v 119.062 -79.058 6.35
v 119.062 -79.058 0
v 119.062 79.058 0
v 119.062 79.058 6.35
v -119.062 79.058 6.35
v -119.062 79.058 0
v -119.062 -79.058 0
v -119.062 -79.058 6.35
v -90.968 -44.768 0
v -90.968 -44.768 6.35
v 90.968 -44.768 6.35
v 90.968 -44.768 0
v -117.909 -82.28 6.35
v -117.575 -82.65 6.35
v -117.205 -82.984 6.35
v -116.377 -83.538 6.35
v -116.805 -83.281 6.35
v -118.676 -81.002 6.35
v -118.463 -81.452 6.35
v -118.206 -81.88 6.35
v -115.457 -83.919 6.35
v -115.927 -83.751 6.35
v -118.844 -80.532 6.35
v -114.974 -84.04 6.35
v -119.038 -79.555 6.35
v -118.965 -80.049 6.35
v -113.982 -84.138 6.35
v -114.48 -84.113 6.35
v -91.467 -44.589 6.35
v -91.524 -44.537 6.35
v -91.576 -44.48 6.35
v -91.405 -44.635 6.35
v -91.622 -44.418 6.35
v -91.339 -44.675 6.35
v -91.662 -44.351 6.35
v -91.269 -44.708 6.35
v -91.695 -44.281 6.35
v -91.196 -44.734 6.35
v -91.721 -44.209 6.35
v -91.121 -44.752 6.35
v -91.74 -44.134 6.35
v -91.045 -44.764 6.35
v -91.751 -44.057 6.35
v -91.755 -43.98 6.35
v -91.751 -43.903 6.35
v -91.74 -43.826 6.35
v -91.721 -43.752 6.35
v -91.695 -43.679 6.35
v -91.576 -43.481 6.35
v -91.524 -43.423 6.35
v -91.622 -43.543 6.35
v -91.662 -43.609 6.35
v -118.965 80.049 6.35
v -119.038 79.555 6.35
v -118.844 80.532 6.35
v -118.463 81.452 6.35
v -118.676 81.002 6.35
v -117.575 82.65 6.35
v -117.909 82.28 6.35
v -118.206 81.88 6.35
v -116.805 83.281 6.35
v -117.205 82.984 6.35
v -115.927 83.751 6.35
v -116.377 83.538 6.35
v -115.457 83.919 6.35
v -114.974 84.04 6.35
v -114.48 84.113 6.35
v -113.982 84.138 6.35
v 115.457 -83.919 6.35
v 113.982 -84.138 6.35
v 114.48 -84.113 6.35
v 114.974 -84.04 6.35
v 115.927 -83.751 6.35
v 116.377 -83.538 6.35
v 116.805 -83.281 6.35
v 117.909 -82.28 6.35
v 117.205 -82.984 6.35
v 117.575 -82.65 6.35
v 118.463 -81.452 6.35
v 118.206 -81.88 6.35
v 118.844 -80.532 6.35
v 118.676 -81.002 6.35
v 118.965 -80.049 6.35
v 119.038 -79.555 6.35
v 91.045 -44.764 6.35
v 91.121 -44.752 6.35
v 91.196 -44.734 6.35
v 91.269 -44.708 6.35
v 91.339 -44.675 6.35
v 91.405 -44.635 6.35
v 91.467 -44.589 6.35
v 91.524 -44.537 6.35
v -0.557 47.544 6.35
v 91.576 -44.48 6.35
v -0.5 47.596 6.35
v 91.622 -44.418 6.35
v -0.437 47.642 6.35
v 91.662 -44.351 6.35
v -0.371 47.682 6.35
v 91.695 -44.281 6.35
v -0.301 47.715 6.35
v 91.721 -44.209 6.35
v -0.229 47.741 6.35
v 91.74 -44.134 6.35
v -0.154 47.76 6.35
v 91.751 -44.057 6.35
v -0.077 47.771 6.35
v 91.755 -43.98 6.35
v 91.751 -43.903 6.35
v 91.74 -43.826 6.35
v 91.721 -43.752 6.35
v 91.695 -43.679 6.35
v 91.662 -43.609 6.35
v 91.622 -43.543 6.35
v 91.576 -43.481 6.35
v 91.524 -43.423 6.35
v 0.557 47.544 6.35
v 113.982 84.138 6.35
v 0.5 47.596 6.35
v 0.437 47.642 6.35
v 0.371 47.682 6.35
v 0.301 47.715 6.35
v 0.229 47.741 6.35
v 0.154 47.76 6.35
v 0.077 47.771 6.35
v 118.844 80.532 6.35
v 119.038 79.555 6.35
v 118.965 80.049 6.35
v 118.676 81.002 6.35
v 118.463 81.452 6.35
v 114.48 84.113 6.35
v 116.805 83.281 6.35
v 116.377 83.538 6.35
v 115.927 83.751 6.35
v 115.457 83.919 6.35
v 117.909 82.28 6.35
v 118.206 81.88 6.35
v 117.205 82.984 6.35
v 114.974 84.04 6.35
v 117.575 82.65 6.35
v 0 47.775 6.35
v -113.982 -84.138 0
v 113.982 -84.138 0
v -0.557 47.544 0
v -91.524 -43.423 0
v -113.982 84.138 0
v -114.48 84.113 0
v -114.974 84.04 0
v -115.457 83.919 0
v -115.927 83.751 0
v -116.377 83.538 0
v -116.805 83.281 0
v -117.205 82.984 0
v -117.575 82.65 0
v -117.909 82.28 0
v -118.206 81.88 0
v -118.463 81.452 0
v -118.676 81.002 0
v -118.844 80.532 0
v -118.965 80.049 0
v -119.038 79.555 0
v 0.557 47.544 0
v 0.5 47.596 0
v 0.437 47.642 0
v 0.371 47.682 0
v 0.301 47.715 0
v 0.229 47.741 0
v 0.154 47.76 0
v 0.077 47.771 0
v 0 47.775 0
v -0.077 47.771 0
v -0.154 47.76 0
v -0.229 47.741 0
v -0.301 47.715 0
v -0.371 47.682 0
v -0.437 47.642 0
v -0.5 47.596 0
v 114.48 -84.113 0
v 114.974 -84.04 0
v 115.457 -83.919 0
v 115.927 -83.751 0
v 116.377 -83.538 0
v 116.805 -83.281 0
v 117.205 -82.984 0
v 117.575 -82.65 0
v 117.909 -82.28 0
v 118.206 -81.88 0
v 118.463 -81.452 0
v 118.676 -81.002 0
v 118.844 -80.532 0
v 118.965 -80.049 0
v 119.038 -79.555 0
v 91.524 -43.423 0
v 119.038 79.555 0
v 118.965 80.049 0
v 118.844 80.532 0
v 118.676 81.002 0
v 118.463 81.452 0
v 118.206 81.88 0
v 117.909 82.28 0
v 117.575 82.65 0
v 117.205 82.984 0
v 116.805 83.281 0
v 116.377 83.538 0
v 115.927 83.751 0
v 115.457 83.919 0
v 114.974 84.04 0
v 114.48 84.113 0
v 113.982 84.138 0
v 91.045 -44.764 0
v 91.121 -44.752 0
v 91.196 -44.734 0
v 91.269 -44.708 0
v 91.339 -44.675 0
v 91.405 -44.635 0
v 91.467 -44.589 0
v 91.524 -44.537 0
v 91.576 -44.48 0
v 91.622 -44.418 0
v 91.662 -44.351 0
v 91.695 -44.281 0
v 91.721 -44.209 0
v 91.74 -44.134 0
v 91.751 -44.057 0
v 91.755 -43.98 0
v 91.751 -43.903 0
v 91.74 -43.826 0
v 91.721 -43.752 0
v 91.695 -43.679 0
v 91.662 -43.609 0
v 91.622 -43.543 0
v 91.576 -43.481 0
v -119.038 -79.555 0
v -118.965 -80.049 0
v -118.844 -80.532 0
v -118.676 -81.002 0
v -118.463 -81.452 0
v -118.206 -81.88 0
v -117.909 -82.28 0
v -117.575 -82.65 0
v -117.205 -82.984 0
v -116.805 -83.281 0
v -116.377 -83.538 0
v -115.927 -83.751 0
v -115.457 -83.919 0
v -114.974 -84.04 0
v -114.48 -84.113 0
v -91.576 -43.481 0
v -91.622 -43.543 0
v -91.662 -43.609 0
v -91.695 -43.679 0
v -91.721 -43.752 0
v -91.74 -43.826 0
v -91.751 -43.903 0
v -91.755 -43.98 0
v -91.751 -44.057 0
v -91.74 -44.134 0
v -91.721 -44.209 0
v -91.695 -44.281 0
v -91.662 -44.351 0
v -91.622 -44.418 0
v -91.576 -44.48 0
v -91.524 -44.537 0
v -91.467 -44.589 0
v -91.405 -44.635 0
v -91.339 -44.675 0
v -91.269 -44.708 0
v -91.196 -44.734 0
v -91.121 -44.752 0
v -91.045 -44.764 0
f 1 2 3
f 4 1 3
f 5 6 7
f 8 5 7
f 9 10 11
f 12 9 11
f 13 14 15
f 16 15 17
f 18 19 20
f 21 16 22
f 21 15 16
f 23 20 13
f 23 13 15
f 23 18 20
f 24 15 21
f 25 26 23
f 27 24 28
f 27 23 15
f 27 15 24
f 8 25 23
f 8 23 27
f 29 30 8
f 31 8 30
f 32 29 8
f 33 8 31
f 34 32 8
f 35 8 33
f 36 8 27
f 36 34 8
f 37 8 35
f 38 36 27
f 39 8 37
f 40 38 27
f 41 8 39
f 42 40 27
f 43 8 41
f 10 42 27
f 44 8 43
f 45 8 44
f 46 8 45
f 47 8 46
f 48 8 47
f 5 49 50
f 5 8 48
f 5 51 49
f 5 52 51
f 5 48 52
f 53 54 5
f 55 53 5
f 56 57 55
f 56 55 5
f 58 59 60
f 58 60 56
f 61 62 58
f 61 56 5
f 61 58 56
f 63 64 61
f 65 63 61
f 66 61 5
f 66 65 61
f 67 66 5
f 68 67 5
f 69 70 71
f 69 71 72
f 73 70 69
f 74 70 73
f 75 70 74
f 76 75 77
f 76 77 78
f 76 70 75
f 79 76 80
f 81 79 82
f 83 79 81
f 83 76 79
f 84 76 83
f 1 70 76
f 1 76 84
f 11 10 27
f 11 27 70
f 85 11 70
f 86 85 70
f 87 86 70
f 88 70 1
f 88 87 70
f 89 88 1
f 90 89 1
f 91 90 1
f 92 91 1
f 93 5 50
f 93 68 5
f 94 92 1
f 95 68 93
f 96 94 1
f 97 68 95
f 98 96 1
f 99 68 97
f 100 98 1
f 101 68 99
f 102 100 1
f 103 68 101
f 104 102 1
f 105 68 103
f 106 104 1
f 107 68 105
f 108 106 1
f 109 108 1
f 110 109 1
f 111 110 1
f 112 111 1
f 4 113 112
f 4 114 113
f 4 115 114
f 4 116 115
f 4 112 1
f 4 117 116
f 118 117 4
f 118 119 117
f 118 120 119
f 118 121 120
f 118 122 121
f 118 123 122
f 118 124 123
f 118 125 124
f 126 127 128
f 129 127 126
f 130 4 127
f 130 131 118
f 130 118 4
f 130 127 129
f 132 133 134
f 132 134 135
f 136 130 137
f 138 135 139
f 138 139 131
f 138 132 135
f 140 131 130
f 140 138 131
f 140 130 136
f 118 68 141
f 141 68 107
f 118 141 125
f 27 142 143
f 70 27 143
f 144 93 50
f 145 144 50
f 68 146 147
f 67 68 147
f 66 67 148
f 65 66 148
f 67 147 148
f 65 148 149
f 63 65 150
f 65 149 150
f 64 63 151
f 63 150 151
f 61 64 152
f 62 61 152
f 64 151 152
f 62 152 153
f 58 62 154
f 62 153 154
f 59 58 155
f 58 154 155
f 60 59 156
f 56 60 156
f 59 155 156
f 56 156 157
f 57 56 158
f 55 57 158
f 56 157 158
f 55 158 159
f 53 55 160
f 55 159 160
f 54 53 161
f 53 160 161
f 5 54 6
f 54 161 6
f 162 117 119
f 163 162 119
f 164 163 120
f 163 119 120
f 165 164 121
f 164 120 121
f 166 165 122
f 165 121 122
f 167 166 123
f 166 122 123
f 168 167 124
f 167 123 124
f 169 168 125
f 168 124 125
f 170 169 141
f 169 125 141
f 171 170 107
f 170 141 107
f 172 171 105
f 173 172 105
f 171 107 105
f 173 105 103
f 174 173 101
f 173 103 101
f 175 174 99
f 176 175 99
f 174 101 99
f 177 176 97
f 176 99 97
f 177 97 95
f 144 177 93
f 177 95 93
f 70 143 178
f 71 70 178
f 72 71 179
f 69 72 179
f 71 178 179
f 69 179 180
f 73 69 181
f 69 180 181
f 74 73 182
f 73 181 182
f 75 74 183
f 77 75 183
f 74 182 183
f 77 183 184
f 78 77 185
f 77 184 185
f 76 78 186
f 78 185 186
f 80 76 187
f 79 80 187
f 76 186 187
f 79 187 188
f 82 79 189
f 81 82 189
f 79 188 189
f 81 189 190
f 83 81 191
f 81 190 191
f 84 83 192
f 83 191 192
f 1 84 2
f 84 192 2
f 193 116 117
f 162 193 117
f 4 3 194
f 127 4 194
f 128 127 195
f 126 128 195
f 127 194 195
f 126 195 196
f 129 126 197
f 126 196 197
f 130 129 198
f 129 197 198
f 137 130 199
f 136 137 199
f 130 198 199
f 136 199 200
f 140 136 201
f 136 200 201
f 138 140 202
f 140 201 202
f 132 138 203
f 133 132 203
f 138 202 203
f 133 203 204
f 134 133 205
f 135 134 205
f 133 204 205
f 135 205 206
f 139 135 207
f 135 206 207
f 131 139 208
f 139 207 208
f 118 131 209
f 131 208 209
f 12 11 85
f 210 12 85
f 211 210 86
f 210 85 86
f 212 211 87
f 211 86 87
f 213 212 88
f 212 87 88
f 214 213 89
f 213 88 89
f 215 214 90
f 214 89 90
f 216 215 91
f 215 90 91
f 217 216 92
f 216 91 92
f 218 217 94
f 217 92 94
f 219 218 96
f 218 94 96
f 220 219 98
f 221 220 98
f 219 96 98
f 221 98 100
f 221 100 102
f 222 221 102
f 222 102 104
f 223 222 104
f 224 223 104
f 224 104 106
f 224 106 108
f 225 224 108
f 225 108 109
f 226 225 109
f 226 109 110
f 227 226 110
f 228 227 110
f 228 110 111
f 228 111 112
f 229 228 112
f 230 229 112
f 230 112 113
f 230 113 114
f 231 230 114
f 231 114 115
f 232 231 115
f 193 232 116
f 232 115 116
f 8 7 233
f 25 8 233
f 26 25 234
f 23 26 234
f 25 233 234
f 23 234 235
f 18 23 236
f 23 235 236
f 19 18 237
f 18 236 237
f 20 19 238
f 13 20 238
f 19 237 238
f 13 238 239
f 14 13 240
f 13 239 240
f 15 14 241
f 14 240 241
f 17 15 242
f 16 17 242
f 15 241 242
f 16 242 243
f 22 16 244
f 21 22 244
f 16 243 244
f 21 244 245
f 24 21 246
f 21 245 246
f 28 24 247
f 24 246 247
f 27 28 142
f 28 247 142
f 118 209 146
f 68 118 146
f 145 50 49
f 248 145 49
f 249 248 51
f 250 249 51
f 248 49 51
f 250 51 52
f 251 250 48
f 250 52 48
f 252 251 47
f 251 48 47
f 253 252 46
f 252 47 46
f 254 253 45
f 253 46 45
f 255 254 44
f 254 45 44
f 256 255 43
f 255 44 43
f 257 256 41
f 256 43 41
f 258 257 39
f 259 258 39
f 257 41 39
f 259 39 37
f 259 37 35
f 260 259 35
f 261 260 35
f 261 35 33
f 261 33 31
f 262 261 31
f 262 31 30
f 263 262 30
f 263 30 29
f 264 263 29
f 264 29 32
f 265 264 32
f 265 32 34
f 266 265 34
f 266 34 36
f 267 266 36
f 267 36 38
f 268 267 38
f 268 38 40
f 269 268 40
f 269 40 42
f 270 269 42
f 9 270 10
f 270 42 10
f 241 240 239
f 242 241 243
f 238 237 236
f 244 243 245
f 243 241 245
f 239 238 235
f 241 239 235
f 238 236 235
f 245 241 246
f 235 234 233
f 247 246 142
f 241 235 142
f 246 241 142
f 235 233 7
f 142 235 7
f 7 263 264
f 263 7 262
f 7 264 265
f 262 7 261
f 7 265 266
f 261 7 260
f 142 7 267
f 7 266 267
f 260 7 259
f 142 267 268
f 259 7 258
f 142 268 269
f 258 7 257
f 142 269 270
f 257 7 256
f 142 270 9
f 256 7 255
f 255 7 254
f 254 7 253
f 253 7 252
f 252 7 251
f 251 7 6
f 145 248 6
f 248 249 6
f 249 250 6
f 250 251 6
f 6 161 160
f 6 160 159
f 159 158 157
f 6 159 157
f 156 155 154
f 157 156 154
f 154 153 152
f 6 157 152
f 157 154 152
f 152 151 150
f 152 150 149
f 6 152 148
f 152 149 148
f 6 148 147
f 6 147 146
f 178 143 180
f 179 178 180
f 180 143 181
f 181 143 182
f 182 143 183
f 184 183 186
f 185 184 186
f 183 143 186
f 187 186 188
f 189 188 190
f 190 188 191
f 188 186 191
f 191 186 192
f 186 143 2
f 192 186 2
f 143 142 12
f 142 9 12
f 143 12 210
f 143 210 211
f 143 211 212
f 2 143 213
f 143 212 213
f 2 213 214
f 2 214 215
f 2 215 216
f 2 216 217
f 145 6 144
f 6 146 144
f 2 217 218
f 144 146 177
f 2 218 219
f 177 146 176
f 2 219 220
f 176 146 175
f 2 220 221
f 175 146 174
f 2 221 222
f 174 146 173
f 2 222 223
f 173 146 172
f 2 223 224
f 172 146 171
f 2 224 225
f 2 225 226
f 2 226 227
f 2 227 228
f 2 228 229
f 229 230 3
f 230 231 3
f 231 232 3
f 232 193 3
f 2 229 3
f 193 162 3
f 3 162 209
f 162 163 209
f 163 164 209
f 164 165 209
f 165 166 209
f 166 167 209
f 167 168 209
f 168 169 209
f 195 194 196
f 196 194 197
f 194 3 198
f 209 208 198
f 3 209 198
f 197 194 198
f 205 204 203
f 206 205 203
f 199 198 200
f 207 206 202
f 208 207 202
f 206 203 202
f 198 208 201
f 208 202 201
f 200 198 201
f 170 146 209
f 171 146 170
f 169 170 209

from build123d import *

# Parameters (mm, degrees)
F1_DEPTH = 6.35
F3_DEPTH = 6.351
F5_DEPTH = 6.351


with BuildPart() as f1:
    # F0 (on Top) → F1 (new body)
    with BuildSketch(Plane.XY):
        with BuildLine():
            Line((113.9825, 84.1375), (-113.9825, 84.1375))
            ThreePointArc((-113.9825, 84.1375), (-117.574602, 82.649602), (-119.0625, 79.0575))
            Line((-119.0625, 79.0575), (-119.0625, -79.0575))
            ThreePointArc((-119.0625, -79.0575), (-117.574602, -82.649602), (-113.9825, -84.1375))
            Line((-113.9825, -84.1375), (113.9825, -84.1375))
            ThreePointArc((113.9825, -84.1375), (117.574602, -82.649602), (119.0625, -79.0575))
            Line((119.0625, -79.0575), (119.0625, 79.0575))
            ThreePointArc((119.0625, 79.0575), (117.574602, 82.649602), (113.9825, 84.1375))
        make_face()
    extrude(amount=F1_DEPTH)

    # F2 (on face) → F3 (cut, through all)
    with BuildSketch(Plane.XY.offset(6.35)):
        Polygon((0, 46.305061), (-89.802561, -43.4975), (89.802561, -43.4975), align=None)
    extrude(amount=-F3_DEPTH, mode=Mode.SUBTRACT)

    # F4 (on face) → F5 (cut, through all)
    with BuildSketch(Plane.XY.offset(6.35)):
        with BuildLine():
            ThreePointArc((0.556776, 47.544337), (0, 47.774961), (-0.556776, 47.544337))
            Line((-0.556776, 47.544337), (-91.524437, -43.423324))
            ThreePointArc((-91.524437, -43.423324), (-91.695123, -44.281425), (-90.967661, -44.7675))
            Line((-90.967661, -44.7675), (90.967661, -44.7675))
            ThreePointArc((90.967661, -44.7675), (91.695123, -44.281425), (91.524437, -43.423324))
            Line((91.524437, -43.423324), (0.556776, 47.544337))
        make_face()
    extrude(amount=-F5_DEPTH, mode=Mode.SUBTRACT)


solid = f1.part
